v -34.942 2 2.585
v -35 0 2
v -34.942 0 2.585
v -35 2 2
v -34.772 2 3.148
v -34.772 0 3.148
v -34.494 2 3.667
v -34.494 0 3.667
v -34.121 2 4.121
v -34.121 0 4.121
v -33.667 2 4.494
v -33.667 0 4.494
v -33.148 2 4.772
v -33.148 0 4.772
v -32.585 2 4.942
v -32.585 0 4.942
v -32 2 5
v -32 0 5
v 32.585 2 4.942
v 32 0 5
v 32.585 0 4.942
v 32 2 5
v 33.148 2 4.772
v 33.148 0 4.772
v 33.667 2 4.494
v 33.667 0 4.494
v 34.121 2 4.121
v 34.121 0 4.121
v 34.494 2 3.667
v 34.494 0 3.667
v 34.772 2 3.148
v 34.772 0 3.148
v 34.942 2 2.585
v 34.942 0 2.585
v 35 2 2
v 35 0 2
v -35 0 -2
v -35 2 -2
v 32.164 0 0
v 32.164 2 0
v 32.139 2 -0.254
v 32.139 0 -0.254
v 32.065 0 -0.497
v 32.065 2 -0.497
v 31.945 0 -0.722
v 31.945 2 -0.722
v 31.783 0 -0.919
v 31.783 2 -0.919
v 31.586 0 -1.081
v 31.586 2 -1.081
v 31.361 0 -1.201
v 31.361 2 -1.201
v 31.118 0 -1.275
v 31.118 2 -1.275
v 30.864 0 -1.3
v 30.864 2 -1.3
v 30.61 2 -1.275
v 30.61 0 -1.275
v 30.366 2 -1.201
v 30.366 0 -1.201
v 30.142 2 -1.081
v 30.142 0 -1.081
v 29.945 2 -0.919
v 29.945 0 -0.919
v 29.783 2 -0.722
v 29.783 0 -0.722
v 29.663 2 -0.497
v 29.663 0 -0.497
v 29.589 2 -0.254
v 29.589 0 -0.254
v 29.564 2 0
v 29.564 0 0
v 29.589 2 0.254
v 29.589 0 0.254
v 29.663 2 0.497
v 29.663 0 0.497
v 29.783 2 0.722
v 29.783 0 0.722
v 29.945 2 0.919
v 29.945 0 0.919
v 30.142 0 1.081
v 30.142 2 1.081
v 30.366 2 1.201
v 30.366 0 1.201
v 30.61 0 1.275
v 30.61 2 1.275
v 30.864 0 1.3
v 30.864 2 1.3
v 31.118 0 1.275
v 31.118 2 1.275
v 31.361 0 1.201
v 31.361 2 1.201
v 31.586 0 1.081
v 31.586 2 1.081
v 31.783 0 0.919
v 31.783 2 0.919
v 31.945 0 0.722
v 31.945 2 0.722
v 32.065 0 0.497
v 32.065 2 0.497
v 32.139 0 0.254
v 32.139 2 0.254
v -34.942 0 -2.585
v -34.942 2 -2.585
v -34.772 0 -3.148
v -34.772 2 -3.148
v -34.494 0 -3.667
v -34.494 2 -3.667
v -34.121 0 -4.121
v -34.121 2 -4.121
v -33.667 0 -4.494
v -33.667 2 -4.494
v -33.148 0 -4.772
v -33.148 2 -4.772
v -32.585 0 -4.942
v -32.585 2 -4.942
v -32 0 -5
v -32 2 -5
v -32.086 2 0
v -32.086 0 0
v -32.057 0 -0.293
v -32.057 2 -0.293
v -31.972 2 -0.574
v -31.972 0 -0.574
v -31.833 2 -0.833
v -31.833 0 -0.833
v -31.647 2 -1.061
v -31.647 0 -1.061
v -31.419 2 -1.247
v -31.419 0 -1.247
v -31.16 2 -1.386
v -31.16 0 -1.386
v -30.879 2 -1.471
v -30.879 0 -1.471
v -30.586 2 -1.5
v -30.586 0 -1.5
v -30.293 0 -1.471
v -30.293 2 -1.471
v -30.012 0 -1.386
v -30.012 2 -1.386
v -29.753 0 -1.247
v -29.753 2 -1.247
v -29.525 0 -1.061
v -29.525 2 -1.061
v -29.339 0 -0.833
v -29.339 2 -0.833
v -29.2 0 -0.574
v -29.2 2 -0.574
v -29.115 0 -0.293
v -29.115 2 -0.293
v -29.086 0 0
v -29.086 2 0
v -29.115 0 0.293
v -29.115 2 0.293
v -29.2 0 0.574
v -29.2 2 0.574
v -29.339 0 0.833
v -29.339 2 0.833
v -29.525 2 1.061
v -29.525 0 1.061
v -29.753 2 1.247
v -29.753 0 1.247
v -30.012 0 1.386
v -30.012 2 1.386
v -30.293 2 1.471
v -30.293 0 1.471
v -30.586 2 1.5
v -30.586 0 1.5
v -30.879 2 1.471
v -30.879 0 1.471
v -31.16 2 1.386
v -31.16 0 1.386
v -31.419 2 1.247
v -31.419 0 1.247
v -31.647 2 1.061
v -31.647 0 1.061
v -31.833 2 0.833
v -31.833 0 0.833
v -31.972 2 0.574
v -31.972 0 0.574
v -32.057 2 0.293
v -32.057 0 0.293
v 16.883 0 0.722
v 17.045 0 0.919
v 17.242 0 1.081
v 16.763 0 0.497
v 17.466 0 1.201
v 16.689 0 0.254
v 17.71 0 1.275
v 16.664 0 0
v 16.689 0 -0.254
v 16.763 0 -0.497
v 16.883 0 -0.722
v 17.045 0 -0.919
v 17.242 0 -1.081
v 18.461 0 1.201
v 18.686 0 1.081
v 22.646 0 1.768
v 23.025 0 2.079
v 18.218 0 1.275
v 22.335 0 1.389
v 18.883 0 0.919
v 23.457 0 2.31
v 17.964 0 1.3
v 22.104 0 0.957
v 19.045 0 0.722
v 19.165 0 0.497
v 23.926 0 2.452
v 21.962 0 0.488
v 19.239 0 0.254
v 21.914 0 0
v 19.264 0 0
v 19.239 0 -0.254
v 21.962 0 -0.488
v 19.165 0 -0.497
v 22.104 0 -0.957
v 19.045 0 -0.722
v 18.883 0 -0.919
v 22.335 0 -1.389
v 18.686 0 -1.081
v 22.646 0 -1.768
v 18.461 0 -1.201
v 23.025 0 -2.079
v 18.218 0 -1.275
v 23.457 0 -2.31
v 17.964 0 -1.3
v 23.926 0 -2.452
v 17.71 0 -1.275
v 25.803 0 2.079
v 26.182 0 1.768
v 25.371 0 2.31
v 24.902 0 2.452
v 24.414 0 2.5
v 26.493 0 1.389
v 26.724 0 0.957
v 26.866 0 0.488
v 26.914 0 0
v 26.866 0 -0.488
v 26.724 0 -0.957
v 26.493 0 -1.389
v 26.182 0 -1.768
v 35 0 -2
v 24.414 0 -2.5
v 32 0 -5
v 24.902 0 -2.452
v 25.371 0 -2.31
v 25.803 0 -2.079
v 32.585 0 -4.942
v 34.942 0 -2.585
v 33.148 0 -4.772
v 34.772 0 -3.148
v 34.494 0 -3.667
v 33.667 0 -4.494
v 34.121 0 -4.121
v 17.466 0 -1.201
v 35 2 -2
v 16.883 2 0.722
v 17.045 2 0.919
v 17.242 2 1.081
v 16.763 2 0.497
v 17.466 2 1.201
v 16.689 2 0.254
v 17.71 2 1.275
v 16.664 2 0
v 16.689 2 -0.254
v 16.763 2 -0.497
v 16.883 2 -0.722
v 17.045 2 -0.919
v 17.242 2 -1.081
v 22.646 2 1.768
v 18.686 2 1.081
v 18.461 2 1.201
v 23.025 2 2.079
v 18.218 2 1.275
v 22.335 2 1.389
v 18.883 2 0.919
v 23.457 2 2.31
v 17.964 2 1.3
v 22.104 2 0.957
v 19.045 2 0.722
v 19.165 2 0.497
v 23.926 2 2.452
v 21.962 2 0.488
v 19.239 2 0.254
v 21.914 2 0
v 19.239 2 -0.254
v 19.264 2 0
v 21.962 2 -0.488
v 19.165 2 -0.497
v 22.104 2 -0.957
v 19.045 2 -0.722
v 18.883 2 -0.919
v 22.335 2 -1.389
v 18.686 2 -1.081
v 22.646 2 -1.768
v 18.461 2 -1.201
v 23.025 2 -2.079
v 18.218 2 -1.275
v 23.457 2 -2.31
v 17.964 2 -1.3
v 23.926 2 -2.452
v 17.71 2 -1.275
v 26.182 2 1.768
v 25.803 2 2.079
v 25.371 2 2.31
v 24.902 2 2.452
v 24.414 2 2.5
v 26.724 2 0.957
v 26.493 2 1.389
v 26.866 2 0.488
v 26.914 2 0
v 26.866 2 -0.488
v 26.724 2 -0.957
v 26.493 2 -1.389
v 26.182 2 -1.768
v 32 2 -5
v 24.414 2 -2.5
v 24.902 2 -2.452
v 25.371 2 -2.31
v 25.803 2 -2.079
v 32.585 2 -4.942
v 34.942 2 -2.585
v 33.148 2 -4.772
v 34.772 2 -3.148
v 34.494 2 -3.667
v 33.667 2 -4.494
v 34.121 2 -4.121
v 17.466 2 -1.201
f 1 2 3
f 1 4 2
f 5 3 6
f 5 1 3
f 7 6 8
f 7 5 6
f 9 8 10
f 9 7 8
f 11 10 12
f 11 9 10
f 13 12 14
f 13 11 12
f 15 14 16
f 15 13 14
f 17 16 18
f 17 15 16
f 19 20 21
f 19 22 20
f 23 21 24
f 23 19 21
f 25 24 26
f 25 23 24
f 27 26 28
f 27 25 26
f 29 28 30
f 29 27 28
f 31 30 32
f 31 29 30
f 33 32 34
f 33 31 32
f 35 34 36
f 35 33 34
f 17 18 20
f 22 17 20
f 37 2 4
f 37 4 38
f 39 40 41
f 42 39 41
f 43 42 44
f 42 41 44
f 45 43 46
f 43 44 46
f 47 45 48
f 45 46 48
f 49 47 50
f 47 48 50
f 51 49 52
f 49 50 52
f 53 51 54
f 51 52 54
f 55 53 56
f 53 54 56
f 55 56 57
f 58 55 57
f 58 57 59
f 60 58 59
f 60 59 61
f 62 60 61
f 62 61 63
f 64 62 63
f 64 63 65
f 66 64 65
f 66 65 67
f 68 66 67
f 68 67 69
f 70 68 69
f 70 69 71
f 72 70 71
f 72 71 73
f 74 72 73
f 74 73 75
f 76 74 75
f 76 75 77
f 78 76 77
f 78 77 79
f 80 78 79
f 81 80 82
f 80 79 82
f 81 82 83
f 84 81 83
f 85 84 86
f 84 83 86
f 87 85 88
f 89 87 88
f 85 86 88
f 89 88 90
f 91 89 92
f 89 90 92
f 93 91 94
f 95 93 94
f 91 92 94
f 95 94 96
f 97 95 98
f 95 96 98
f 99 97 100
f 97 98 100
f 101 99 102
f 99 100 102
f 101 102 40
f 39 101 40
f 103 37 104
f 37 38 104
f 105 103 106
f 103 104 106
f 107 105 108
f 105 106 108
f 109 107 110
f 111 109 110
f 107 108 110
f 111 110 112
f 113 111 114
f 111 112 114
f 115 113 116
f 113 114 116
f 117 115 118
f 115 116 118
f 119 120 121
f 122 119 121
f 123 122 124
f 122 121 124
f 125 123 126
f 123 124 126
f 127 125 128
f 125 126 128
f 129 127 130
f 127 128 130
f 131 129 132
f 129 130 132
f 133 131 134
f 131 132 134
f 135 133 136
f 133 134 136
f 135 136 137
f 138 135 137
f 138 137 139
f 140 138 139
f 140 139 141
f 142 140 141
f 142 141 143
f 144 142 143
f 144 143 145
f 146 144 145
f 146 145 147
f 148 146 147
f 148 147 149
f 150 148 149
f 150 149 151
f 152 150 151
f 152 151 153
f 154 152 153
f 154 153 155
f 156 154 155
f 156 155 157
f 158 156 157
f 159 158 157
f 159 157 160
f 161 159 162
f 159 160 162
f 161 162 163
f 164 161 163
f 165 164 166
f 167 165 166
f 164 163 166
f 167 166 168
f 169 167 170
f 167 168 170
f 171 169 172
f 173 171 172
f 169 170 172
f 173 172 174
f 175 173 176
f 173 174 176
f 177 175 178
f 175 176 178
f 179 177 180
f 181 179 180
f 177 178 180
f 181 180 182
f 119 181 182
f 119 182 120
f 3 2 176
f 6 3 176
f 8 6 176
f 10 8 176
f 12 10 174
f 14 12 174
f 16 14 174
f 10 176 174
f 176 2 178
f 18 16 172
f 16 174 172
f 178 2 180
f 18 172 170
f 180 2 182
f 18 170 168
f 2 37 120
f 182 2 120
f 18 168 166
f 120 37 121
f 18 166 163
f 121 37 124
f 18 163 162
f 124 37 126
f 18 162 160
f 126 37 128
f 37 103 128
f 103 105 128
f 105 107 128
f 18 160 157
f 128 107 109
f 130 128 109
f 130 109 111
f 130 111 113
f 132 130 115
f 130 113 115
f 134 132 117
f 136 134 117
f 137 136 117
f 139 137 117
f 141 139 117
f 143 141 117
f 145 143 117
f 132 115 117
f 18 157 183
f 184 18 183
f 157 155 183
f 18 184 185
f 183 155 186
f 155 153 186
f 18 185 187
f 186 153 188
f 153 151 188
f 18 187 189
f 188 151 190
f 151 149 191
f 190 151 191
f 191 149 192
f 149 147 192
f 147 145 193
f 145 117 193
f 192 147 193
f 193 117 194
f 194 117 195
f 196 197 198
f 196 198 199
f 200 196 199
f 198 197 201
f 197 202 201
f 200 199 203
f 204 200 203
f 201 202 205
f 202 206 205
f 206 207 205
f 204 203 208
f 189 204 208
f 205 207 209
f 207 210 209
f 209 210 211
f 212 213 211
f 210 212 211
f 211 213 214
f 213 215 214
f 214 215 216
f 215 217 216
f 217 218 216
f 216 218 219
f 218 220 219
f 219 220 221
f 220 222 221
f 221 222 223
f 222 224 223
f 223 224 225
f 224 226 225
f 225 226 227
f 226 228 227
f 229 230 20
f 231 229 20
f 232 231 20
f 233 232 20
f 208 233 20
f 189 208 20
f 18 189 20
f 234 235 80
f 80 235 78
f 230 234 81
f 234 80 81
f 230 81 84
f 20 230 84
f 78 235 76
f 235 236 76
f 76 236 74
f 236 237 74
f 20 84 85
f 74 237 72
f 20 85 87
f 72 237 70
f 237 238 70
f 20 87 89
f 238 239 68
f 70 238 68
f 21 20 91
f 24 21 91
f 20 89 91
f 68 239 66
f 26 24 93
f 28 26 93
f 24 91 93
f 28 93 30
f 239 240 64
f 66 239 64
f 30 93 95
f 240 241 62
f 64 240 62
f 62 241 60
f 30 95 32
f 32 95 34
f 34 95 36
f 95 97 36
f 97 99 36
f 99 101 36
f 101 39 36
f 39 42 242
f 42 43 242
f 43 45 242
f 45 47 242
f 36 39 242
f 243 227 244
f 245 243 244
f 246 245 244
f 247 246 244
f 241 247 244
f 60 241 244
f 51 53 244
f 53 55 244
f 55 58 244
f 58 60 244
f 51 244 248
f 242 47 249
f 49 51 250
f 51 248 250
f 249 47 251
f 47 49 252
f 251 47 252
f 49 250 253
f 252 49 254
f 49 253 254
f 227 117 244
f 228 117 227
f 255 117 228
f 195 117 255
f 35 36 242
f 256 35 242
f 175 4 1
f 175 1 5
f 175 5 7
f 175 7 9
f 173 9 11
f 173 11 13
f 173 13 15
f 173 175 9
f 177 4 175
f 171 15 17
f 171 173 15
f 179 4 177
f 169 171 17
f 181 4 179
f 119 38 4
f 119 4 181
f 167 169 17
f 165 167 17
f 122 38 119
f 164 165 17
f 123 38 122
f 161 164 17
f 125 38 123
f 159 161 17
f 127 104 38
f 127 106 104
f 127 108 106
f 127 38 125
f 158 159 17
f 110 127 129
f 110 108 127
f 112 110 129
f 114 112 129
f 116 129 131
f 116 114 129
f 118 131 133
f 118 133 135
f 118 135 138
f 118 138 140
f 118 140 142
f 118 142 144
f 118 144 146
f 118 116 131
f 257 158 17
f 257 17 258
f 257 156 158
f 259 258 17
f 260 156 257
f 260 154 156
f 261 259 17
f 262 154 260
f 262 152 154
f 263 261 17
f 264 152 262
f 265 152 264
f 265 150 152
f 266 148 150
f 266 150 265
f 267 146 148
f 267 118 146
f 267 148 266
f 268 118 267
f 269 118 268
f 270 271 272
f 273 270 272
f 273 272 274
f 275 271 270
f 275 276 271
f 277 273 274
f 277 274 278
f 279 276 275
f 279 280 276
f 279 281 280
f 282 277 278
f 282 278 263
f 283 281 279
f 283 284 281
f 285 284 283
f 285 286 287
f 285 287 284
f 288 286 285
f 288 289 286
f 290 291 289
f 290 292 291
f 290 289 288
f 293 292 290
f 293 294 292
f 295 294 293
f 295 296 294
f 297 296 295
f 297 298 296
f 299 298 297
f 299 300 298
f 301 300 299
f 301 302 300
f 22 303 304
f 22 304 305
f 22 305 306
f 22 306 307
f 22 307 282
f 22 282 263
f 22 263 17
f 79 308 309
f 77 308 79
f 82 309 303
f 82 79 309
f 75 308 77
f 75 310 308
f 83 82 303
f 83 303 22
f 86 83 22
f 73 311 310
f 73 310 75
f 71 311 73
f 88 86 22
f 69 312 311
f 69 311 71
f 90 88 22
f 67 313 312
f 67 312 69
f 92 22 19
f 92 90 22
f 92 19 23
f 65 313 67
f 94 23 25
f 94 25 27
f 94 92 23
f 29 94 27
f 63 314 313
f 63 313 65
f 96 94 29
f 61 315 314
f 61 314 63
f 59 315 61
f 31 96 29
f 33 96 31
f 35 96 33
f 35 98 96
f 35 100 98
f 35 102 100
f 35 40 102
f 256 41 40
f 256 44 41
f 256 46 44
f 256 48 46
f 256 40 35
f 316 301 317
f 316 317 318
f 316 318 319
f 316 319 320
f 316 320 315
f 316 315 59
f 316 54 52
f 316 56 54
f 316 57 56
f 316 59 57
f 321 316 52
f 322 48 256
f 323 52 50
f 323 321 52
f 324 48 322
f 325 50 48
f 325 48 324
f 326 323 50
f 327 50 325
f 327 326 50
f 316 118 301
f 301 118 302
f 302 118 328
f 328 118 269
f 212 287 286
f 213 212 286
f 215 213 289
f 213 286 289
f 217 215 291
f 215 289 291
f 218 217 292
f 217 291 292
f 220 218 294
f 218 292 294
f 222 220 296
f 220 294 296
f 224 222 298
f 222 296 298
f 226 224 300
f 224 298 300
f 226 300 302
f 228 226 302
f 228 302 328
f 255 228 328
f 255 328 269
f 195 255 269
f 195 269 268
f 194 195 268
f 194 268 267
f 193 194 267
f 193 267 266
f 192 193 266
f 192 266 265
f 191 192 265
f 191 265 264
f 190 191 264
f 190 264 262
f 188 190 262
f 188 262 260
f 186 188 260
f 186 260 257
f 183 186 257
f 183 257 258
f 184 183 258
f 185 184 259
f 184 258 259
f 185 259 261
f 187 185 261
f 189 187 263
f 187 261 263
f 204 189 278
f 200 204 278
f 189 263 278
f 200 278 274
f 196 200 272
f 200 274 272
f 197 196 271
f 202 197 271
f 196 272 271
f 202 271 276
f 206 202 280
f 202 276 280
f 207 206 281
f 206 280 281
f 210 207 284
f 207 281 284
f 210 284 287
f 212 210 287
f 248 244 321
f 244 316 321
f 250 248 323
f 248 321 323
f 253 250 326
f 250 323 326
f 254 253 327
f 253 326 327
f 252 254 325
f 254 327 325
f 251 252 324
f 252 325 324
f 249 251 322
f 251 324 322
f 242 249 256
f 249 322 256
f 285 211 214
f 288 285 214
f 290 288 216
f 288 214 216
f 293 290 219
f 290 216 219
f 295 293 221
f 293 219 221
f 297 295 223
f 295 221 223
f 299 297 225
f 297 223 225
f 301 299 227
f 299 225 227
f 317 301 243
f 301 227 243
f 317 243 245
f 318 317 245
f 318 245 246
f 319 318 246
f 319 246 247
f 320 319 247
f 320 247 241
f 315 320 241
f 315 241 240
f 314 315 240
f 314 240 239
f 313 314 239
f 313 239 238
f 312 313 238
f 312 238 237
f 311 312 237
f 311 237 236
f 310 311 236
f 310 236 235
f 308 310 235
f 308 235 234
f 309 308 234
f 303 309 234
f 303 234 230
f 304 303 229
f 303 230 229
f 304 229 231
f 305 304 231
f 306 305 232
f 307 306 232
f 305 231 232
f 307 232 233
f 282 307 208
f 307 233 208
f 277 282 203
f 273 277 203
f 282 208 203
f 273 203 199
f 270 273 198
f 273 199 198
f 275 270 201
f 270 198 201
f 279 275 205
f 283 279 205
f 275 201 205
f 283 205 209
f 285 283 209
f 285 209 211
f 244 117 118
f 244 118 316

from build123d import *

# Parameters (mm, degrees)
SKETCH1_W             = 70
SKETCH1_H             = 10
BOSS_EXTRUDE1_DEPTH   = 2
F_5_0MM_DOWEL_HOLE1_D = 5
F_3_0MM_DOWEL_HOLE1_D = 3
SKETCH2_R             = 1.3
CUT_EXTRUDE1_DEPTH    = 3
FILLET1_R             = 3


with BuildPart() as part:
    # Sketch1 → Boss-Extrude1 (new body)
    with BuildSketch(Plane(origin=(0, 0, 0), x_dir=(1, 0, 0), z_dir=(0, 1, 0))):
        Rectangle(SKETCH1_W, SKETCH1_H)
    extrude(amount=BOSS_EXTRUDE1_DEPTH)

    # Ø5.0mm Dowel Hole1 (through all)
    with Locations(Plane(origin=(0, 2, 0), x_dir=(1, 0, 0), z_dir=(0, 1, 0))):
        with Locations((24.413883152, 0)):
            Hole(F_5_0MM_DOWEL_HOLE1_D / 2)

    # Ø3.0mm Dowel Hole1 (through all)
    with Locations(Plane(origin=(0, 2, 0), x_dir=(1, 0, 0), z_dir=(0, 1, 0))):
        with Locations((-30.586116848, 0)):
            Hole(F_3_0MM_DOWEL_HOLE1_D / 2)

    # Sketch2 → Cut-Extrude1 (cut)
    with BuildSketch(Plane(origin=(0, 2, 0), x_dir=(1, 0, 0), z_dir=(0, 1, 0))):
        with Locations((30.863883152, 0)):
            Circle(SKETCH2_R)
        with Locations((17.963883152, 0)):
            Circle(SKETCH2_R)
    extrude(amount=-CUT_EXTRUDE1_DEPTH, mode=Mode.SUBTRACT)

    # Fillet1
    fillet1_edges = [part.edges().sort_by_distance(p)[0] for p in [
        (35, 1, 5),
        (-35, 1, 5),
        (-35, 1, -5),
        (35, 1, -5),
    ]]
    fillet(fillet1_edges, radius=FILLET1_R)


solid = part.part
